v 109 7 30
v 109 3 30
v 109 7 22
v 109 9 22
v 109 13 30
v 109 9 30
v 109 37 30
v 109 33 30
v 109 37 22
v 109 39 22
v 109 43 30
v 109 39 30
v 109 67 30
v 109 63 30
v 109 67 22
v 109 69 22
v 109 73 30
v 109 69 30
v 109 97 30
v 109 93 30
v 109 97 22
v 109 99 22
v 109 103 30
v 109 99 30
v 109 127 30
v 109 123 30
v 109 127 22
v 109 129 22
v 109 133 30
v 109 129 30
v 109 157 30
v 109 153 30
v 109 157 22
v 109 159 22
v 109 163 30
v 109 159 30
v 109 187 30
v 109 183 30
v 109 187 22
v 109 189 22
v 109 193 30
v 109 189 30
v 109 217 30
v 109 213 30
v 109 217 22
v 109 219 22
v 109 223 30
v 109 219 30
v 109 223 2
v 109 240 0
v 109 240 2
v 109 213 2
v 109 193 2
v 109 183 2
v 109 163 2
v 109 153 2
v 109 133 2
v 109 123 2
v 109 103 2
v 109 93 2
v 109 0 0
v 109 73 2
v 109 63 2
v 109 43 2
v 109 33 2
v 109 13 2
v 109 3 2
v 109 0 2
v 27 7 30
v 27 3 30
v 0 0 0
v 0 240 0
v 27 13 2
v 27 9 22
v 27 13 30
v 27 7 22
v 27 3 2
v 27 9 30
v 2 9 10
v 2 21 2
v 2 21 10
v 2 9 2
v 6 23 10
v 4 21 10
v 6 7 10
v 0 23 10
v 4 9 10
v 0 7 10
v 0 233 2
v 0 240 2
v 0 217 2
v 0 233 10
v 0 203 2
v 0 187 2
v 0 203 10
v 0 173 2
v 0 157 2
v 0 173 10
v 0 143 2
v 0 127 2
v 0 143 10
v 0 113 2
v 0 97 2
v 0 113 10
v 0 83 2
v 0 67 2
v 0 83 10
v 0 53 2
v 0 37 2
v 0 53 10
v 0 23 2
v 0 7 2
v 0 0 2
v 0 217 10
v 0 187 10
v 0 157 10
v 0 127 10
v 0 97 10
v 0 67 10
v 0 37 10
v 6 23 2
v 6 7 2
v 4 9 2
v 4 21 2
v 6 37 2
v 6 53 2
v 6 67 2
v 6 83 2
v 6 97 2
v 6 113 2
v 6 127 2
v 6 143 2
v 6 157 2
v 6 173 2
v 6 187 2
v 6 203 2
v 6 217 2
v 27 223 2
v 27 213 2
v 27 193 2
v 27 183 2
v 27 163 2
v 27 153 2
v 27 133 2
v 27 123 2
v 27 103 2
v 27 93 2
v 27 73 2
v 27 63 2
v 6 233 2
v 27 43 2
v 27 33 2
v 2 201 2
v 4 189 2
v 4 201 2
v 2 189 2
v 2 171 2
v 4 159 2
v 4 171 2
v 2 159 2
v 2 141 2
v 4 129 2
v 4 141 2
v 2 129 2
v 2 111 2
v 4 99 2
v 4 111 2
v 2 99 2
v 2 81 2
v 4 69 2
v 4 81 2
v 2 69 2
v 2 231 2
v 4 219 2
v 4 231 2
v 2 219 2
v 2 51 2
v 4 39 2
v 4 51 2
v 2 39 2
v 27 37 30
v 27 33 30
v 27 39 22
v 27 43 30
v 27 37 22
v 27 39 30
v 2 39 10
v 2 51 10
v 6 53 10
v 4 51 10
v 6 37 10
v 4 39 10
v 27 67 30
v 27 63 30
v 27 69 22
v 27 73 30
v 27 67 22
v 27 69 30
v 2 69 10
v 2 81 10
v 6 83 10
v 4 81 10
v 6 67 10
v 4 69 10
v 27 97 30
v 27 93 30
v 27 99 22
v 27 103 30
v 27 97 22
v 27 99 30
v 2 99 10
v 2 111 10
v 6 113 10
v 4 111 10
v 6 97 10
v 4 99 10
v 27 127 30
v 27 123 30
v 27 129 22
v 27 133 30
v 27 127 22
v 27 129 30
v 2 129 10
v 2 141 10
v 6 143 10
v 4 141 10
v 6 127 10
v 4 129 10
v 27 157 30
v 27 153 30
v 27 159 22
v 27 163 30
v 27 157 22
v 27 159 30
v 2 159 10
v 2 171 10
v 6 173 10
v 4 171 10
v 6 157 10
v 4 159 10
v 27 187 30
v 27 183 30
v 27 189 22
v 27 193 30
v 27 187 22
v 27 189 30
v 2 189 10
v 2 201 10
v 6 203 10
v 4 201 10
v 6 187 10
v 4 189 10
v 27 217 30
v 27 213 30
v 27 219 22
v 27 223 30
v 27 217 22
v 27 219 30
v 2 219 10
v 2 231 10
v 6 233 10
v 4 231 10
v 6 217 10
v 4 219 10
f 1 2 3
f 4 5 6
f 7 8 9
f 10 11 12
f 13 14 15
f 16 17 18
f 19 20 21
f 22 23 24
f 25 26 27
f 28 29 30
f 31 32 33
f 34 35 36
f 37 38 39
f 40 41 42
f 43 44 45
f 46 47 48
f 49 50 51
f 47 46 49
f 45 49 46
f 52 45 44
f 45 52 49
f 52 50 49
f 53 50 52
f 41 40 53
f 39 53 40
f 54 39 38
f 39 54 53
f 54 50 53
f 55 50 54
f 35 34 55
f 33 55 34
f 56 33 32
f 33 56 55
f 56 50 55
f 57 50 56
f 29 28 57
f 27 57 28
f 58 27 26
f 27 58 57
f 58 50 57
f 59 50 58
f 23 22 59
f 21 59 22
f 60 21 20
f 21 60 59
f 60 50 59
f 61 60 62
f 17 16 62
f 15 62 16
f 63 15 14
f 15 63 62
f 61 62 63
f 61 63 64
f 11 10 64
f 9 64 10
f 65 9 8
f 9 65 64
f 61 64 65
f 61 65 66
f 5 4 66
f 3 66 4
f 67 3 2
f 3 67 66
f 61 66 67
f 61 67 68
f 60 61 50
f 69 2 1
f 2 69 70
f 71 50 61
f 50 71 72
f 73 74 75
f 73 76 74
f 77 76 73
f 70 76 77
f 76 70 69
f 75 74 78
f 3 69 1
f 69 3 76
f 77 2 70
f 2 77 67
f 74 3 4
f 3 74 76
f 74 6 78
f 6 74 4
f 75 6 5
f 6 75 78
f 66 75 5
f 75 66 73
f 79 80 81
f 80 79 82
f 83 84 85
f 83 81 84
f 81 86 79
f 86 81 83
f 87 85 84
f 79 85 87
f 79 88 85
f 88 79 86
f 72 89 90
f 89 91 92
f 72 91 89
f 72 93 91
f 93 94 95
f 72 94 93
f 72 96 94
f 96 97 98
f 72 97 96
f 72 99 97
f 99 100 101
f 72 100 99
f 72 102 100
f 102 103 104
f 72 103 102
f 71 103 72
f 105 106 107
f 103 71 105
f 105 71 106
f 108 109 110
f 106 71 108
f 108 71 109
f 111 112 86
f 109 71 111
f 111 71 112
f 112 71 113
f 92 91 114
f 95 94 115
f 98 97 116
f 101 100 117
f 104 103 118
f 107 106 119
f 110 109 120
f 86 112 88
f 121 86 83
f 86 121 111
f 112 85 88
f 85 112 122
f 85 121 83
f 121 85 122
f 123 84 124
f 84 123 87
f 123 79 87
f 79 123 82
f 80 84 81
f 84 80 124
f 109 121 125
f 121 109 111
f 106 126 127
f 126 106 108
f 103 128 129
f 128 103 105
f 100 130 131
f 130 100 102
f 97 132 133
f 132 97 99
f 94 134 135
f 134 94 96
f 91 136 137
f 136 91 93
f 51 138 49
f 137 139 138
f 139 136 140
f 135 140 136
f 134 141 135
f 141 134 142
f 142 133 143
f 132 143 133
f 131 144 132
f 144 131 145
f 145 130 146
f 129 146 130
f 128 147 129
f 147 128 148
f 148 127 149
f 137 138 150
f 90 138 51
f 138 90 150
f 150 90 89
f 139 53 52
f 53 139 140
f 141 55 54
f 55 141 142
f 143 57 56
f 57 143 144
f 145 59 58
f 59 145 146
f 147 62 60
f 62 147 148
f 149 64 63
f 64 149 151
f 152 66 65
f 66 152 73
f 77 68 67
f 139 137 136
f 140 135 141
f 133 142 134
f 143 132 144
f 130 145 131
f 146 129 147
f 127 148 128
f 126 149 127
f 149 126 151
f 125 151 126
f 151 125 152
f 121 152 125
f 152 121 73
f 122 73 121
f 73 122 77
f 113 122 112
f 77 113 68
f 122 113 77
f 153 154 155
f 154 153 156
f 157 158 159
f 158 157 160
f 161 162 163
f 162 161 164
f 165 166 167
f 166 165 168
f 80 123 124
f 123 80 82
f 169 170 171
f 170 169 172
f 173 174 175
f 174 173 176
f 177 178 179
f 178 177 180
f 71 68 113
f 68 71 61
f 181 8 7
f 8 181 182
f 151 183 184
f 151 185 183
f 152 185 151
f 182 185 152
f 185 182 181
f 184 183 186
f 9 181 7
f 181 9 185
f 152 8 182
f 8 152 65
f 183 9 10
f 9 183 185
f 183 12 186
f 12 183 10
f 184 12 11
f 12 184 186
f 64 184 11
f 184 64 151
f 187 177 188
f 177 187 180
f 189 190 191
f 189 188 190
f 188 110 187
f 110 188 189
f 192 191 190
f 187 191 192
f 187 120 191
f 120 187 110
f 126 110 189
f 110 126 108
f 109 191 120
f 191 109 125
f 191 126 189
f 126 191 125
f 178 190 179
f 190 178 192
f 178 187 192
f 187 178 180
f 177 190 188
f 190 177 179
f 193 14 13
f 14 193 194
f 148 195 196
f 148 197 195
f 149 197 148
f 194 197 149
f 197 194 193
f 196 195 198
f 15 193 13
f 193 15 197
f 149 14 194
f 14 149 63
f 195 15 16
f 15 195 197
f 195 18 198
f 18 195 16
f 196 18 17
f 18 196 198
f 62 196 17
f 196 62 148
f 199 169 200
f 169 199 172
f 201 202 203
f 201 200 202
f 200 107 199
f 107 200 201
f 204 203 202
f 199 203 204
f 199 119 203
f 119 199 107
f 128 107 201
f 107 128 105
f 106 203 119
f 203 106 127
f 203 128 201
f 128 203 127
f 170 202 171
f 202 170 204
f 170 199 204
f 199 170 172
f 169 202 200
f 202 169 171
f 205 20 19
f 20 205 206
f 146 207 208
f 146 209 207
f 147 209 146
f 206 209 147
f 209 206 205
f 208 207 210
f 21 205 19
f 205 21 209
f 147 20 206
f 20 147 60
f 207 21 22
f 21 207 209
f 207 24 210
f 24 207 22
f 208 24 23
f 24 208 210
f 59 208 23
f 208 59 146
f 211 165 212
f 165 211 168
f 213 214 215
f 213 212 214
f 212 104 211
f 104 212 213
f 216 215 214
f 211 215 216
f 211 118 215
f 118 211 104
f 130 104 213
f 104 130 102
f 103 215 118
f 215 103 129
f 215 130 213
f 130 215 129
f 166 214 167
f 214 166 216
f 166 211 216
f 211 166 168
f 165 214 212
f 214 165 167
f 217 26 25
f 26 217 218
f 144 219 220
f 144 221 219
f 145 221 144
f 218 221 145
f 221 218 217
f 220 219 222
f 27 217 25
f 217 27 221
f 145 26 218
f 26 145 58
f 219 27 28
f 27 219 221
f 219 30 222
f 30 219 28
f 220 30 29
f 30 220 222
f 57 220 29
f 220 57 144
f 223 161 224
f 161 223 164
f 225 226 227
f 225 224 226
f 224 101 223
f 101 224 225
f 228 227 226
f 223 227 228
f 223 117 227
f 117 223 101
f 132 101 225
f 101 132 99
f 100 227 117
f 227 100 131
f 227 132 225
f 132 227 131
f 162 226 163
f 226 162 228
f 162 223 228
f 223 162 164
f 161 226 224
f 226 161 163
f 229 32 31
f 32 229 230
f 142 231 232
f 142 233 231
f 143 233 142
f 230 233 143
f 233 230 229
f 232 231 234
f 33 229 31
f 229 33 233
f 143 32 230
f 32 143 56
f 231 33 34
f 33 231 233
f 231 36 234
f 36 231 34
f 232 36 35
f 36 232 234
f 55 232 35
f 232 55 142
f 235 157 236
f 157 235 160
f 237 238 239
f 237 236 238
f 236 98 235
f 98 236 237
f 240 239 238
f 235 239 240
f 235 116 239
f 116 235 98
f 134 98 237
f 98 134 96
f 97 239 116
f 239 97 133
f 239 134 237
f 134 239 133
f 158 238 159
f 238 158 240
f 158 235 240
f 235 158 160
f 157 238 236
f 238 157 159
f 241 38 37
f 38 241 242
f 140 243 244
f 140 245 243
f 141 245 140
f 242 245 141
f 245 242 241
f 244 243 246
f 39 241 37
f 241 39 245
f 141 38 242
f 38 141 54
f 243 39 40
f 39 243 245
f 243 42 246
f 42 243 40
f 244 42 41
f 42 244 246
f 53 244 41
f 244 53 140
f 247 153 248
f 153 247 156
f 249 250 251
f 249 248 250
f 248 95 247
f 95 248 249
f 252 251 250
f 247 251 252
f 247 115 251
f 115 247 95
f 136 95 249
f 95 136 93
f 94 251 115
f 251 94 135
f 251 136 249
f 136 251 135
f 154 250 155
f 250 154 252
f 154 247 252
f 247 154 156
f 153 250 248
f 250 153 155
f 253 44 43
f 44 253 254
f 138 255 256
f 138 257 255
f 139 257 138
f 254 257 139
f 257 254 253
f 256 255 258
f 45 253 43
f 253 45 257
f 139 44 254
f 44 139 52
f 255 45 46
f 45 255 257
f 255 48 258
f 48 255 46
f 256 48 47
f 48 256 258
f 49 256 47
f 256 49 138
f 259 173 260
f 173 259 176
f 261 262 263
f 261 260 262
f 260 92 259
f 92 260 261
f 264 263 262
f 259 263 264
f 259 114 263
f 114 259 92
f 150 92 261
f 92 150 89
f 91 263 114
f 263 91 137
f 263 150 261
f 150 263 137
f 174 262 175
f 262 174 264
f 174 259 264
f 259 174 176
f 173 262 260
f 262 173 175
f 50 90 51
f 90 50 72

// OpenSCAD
// file: ../cardshowcase.scad
module base_tarjeta(desplazamiento, posicion_tarjeta, longitud_tarjeta, altura_borde_tarjeta, altura_interior_tarjeta)
{
    color("purple") translate([ posicion_tarjeta, desplazamiento + 1, 0 ])
        cube([ longitud_tarjeta, 4, altura_borde_tarjeta + 2 ]);

    color("pink") translate([ posicion_tarjeta, desplazamiento + 5, 0 ])
        cube([ longitud_tarjeta, 2, altura_interior_tarjeta + 2 ]);

    color("purple") translate([ posicion_tarjeta, desplazamiento + 7, 0 ])
        cube([ longitud_tarjeta, 4, altura_borde_tarjeta + 2 ]);
}

module base_tarjeta_corta(desplazamiento, posicion_tarjeta, longitud_tarjeta, altura_borde_tarjeta,
                          altura_interior_tarjeta, tab_size)
{
    color("purple") translate([ posicion_tarjeta, desplazamiento + 1, 0 ])
        cube([ tab_size, 4, altura_borde_tarjeta + 2 ]);

    color("pink") translate([ posicion_tarjeta, desplazamiento + 5, 0 ])
        cube([ tab_size, 2, altura_interior_tarjeta + 2 ]);

    color("purple") translate([ posicion_tarjeta, desplazamiento + 7, 0 ])
        cube([ tab_size, 4, altura_borde_tarjeta + 2 ]);

    color("purple") translate([ longitud_tarjeta + posicion_tarjeta - tab_size, desplazamiento + 1, 0 ])
        cube([ tab_size, 4, altura_borde_tarjeta + 2 ]);

    color("pink") translate([ longitud_tarjeta + posicion_tarjeta - tab_size, desplazamiento + 5, 0 ])
        cube([ tab_size, 2, altura_interior_tarjeta + 2 ]);

    color("purple") translate([ longitud_tarjeta + posicion_tarjeta - tab_size, desplazamiento + 7, 0 ])
        cube([ tab_size, 4, altura_borde_tarjeta + 2 ]);
}

module soporte_tarjeta(tipo, size)
{
    if (tipo == "ISA8")
    {
        desplazamiento = 2;
        posicion_tarjeta = 27;
        longitud_tarjeta = 82;
        altura_borde_tarjeta = 28;
        altura_interior_tarjeta = 20;

        if (size == 0)
        {
            base_tarjeta(desplazamiento, posicion_tarjeta, longitud_tarjeta, altura_borde_tarjeta,
                         altura_interior_tarjeta);
        }
        else
        {
            base_tarjeta_corta(desplazamiento, posicion_tarjeta, longitud_tarjeta, altura_borde_tarjeta,
                               altura_interior_tarjeta, size);
        }
    }
    else if (tipo == "ISA16")
    {
        soporte_tarjeta("ISA8", size);

        desplazamiento = 2;
        posicion_tarjeta = 28 + 81 + 5;
        longitud_tarjeta = 48;
        altura_borde_tarjeta = 28;
        altura_interior_tarjeta = 20;

        if (size == 0)
        {
            base_tarjeta(desplazamiento, posicion_tarjeta, longitud_tarjeta, altura_borde_tarjeta,
                         altura_interior_tarjeta);
        }
        else
        {
            base_tarjeta_corta(desplazamiento, posicion_tarjeta, longitud_tarjeta, altura_borde_tarjeta,
                               altura_interior_tarjeta, size);
        }
    }
    else if (tipo == "VLB")
    {
        soporte_tarjeta("ISA16", size);

        desplazamiento = 2;
        posicion_tarjeta = 28 + 135 + 8;
        longitud_tarjeta = 75;
        altura_borde_tarjeta = 28;
        altura_interior_tarjeta = 20;

        if (size == 0)
        {
            base_tarjeta(desplazamiento, posicion_tarjeta, longitud_tarjeta, altura_borde_tarjeta,
                         altura_interior_tarjeta);
        }
        else
        {
            base_tarjeta_corta(desplazamiento, posicion_tarjeta, longitud_tarjeta, altura_borde_tarjeta,
                               altura_interior_tarjeta, size);
        }
    }
    else if (tipo == "PCI")
    {
        desplazamiento = 16;
        posicion_tarjeta = 43;
        longitud_tarjeta = 82;
        altura_borde_tarjeta = 28;
        altura_interior_tarjeta = 20;

        if (size == 0)
        {
            base_tarjeta(desplazamiento, posicion_tarjeta, longitud_tarjeta, altura_borde_tarjeta,
                         altura_interior_tarjeta);
        }
        else
        {
            base_tarjeta_corta(desplazamiento, posicion_tarjeta, longitud_tarjeta, altura_borde_tarjeta,
                               altura_interior_tarjeta, size);
        }
    }
    else if (tipo == "PCIe16")
    {
        desplazamiento = 16;
        posicion_tarjeta = 50;
        longitud_tarjeta = 85;
        altura_borde_tarjeta = 24;
        altura_interior_tarjeta = 16;

        if (size == 0)
        {
            base_tarjeta(desplazamiento, posicion_tarjeta, longitud_tarjeta, altura_borde_tarjeta,
                         altura_interior_tarjeta);
        }
        else
        {
            base_tarjeta_corta(desplazamiento, posicion_tarjeta, longitud_tarjeta, altura_borde_tarjeta,
                               altura_interior_tarjeta, size);
        }
    }
    else if (tipo == "PCIe8")
    {
        desplazamiento = 16;
        posicion_tarjeta = 50;
        longitud_tarjeta = 52;
        altura_borde_tarjeta = 24;
        altura_interior_tarjeta = 16;

        if (size == 0)
        {
            base_tarjeta(desplazamiento, posicion_tarjeta, longitud_tarjeta, altura_borde_tarjeta,
                         altura_interior_tarjeta);
        }
        else
        {
            base_tarjeta_corta(desplazamiento, posicion_tarjeta, longitud_tarjeta, altura_borde_tarjeta,
                               altura_interior_tarjeta, size);
        }
    }
    else if (tipo == "PCIe4")
    {
        desplazamiento = 16;
        posicion_tarjeta = 50;
        longitud_tarjeta = 35;
        altura_borde_tarjeta = 24;
        altura_interior_tarjeta = 16;

        if (size == 0)
        {
            base_tarjeta(desplazamiento, posicion_tarjeta, longitud_tarjeta, altura_borde_tarjeta,
                         altura_interior_tarjeta);
        }
        else
        {
            base_tarjeta_corta(desplazamiento, posicion_tarjeta, longitud_tarjeta, altura_borde_tarjeta,
                               altura_interior_tarjeta, size);
        }
    }
    else if (tipo == "PCIe1")
    {
        desplazamiento = 16;
        posicion_tarjeta = 50;
        longitud_tarjeta = 21;
        altura_borde_tarjeta = 24;
        altura_interior_tarjeta = 16;

        if (size == 0)
        {
            base_tarjeta(desplazamiento, posicion_tarjeta, longitud_tarjeta, altura_borde_tarjeta,
                         altura_interior_tarjeta);
        }
        else
        {
            base_tarjeta_corta(desplazamiento, posicion_tarjeta, longitud_tarjeta, altura_borde_tarjeta,
                               altura_interior_tarjeta, size);
        }
    }
    else if (tipo == "AGP")
    {
        desplazamiento = 16;
        posicion_tarjeta = 70;
        longitud_tarjeta = 68;
        altura_borde_tarjeta = 28;
        altura_interior_tarjeta = 20;

        if (size == 0)
        {
            base_tarjeta(desplazamiento, posicion_tarjeta, longitud_tarjeta, altura_borde_tarjeta,
                         altura_interior_tarjeta);
        }
        else
        {
            base_tarjeta_corta(desplazamiento, posicion_tarjeta, longitud_tarjeta, altura_borde_tarjeta,
                               altura_interior_tarjeta, size);
        }
    }
    else if (tipo == "EISA")
    {
        desplazamiento = 2;
        posicion_tarjeta = 27;
        longitud_tarjeta = 52 + 83;
        altura_borde_tarjeta = 28;
        altura_interior_tarjeta = 15;

        if (size == 0)
        {
            base_tarjeta(desplazamiento, posicion_tarjeta, longitud_tarjeta, altura_borde_tarjeta,
                         altura_interior_tarjeta);
        }
        else
        {
            base_tarjeta_corta(desplazamiento, posicion_tarjeta, longitud_tarjeta, altura_borde_tarjeta,
                               altura_interior_tarjeta, size);
        }
    }
}

module base_placa(tipo)
{
    if (tipo == "ISA8")
    {
        color("cyan") cube([ 109, 30, 2 ]);
    }
    else if (tipo == "ISA16")
    {
        color("cyan") cube([ 162, 30, 2 ]);
    }
    else if (tipo == "VLB")
    {
        color("cyan") cube([ 246, 30, 2 ]);
    }
    else if (tipo == "PCI")
    {
        color("cyan") cube([ 125, 30, 2 ]);
    }
    else if (tipo == "PCIe16")
    {
        color("cyan") cube([ 135, 30, 2 ]);
    }
    else if (tipo == "PCIe8")
    {
        color("cyan") cube([ 102, 30, 2 ]);
    }
    else if (tipo == "PCIe4")
    {
        color("cyan") cube([ 85, 30, 2 ]);
    }
    else if (tipo == "PCIe1")
    {
        color("cyan") cube([ 71, 30, 2 ]);
    }
    else if (tipo == "AGP")
    {
        color("cyan") cube([ 138, 30, 2 ]);
    }
    else if (tipo == "EISA")
    {
        color("cyan") cube([ 162, 30, 2 ]);
    }
    else if (is_num(tipo))
    {
        color("cyan") cube([ tipo, 30, 2]);
    }
}

override_base = undef;

module base(tipo)
{
    if (override_base == undef)
    {
        base_placa(tipo);
    }
    else
    {
        base_placa(override_base);
    }
}

module single_slot(tipo, position, size = 0)
{
    displacement = position * 30;

    color("red") translate([ 0, 7 + displacement, 0 ]) cube([ 2, 16, 10 ]);

    color("red") translate([ 4, 7 + displacement, 0 ]) cube([ 2, 16, 10 ]);

    color("red") translate([ 2, 7 + displacement, 0 ]) cube([ 2, 2, 10 ]);

    color("red") translate([ 2, 21 + displacement, 0 ]) cube([ 2, 2, 10 ]);

    translate([ 0, displacement, 0 ]) soporte_tarjeta(tipo, size);
    translate([ 0, displacement, 0 ]) base(tipo);
}
// main file
include <../cardshowcase.scad>

for ( i = [0 : 7] ){
    single_slot("ISA8", i);
}
